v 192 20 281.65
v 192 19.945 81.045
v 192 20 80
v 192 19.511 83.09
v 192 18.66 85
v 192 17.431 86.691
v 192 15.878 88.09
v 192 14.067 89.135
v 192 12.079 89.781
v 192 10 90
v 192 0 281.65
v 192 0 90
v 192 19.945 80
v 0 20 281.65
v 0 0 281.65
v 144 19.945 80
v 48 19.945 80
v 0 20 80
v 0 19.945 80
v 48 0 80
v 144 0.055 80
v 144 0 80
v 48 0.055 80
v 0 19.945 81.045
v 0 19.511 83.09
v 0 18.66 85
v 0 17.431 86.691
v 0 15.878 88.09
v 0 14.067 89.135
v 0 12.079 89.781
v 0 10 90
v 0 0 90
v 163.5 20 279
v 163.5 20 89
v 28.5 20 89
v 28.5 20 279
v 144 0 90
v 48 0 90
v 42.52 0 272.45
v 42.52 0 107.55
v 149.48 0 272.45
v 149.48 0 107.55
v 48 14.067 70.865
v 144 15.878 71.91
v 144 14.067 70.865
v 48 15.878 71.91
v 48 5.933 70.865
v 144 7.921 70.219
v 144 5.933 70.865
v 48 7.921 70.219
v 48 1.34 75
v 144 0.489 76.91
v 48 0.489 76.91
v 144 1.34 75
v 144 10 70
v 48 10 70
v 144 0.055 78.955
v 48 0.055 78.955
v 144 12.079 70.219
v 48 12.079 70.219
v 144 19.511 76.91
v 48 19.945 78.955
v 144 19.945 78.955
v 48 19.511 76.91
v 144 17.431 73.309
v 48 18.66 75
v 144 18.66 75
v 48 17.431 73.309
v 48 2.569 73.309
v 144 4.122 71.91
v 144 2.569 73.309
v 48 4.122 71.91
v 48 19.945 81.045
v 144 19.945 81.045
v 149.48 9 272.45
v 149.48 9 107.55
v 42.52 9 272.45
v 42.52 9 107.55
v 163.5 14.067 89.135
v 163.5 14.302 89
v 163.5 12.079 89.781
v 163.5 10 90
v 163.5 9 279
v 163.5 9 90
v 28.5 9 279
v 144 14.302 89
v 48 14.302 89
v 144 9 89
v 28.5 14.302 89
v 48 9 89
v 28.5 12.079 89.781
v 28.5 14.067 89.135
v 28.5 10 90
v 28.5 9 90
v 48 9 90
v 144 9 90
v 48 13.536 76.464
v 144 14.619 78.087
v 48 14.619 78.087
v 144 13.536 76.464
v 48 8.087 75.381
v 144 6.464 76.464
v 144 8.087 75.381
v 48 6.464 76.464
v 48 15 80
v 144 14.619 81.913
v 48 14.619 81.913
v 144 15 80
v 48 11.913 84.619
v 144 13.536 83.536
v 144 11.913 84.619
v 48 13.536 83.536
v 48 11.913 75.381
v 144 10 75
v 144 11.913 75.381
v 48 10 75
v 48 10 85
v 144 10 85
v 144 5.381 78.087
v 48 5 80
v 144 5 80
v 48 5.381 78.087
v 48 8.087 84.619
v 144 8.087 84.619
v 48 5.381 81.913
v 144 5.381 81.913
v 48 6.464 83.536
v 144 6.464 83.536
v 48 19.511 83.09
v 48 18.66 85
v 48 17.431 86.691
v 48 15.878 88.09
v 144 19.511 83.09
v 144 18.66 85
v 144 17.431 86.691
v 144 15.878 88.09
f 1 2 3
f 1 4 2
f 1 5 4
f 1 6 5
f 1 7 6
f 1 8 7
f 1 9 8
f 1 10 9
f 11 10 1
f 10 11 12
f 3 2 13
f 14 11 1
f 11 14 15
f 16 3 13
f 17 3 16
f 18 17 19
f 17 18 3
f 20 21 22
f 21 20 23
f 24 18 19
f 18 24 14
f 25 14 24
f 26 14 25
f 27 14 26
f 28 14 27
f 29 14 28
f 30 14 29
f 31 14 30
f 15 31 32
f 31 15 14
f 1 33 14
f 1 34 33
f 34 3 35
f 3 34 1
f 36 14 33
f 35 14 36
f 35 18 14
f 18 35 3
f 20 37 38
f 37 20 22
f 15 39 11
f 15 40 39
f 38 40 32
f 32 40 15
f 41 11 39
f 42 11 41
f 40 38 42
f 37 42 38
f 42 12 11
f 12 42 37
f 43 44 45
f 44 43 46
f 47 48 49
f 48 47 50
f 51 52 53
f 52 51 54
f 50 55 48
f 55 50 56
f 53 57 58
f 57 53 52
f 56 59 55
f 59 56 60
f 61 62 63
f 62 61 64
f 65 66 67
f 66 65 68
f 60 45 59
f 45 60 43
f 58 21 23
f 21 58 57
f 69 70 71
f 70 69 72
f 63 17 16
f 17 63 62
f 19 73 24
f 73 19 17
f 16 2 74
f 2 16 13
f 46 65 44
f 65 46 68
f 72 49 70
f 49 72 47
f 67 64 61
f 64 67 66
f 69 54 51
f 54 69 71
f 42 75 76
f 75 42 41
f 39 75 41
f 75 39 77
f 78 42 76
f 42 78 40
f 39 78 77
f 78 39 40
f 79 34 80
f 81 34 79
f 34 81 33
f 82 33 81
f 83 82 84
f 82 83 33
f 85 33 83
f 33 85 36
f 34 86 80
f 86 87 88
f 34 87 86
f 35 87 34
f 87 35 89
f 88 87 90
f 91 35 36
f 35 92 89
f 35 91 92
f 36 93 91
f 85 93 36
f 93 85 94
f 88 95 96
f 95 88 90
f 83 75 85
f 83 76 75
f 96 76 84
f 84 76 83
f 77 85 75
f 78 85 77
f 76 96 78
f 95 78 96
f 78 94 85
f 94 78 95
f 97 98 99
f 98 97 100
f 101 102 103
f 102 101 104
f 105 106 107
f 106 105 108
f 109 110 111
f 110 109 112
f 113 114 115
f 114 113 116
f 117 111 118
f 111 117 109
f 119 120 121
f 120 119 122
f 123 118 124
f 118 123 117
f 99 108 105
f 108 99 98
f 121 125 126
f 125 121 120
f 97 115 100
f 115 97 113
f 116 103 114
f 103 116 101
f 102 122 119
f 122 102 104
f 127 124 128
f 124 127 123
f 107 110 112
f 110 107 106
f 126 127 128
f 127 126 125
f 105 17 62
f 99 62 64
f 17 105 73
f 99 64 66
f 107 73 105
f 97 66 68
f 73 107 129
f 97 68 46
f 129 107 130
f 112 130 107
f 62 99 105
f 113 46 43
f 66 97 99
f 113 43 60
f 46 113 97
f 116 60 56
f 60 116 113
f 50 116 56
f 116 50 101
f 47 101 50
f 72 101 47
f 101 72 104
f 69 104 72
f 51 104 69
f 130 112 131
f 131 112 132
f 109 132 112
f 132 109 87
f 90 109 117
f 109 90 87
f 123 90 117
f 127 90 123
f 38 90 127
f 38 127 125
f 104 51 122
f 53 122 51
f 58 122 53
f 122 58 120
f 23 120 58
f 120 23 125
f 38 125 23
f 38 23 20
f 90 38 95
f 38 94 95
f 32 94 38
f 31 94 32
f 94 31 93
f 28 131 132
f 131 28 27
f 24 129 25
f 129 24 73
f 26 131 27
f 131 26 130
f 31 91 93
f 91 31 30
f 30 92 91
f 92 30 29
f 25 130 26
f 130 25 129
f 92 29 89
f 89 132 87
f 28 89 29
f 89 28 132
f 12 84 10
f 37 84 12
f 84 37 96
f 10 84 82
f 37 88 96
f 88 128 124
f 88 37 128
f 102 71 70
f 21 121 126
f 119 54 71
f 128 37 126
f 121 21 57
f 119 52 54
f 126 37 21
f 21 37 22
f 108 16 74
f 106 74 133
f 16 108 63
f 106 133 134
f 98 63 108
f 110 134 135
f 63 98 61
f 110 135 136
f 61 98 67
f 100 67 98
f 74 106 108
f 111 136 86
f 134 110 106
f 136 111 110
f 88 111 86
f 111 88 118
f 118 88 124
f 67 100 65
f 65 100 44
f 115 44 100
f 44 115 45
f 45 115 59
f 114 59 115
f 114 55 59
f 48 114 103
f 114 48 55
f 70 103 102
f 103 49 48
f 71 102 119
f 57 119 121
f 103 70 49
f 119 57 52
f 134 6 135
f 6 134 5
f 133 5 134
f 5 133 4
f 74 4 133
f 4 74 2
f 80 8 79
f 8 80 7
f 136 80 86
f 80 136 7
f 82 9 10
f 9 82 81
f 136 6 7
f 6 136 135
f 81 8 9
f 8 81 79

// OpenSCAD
/*

SE/3D is the best name I can come up with for a machine that combines a 3 axis CNC
with a computer to design, model and program the things the CNC is used to make. 

Some basic (potential) requirements:
* Portable
* 3d printing
* lasering
* milling(?)
* Solder station
* VOM/o-scope
* Parts bin
* 100mm3 build volume
* Fast enough to print the entire build envelope in ~30 minutes
* Core-XY (http://corexy.com/theory.html)
* 3D scanner (object capture, teleportation)

The design is based on the Macintosh SE/30.  It occured to me when I saw my (unfinished)
Tantilus printer next to an actual Macintosh SE and noticied the similarity. 

(then why is it based on the SE/30 and not the SE?  Because the SE/30 is cooler)

In a perfect world the SE/3D would be a true Reprap and capable of producing offspring. 
I'll try to make that happen.

Parts (other than the 3D printed parts)
* Waveshare LCD
* Some SBC
* Some CNC control board (RAMPS? RAMBO?)
* NEMA?? Stepper motors (x3)
* Belts
* Toothed pulley (x2), maybe they are called cogs?
* Various "minerals"

*/

/*
Original SE/30 dimensions.
(https://en.wikipedia.org/wiki/Macintosh_SE/30)
HEIGHT: 350
WIDTH:  240
DEPTH:  280
*/

SCALE = 0.80;
WALL_THICKNESS = 3;

HEIGHT = 350 * SCALE;
WIDTH = 240 * SCALE;
DEPTH = 280 * SCALE;

DOOR_HEIGHT = 250 * SCALE;
DOOR_DEPTH = 20;

FOOT_HEIGHT = HEIGHT * .15;

BIN_HEIGHT = HEIGHT * .25;
BIN_WIDTH = WIDTH * .90;
BIN_DEPTH = DEPTH-DOOR_DEPTH-10;

// Display dimensions
LCD_HEIGHT = 164.90;
LCD_WIDTH = 124.27;
LCD_DEPTH = 10; // estimate

// TODO: Get SBC dimensions
// TODO: Get CNC controller dimensions
// TODO: Get power supply dimensions

/*
difference(){
    
    // main body
    cube([WIDTH, DEPTH, HEIGHT]);
    
    // hollow-out 
    translate([WALL_THICKNESS,DOOR_DEPTH+WALL_THICKNESS,WALL_THICKNESS]){
      cube([WIDTH-(WALL_THICKNESS*2), DEPTH-DOOR_DEPTH-(WALL_THICKNESS*2), HEIGHT-WALL_THICKNESS*2]);
    }

    // Cut-out "foot"
    translate([0,0,0]){
        cube([WIDTH,DOOR_DEPTH,FOOT_HEIGHT]);
    }
    
    // TODO: Cut-out carry handle
    // TODO: Cut-out XY axis
    // TODO: Cut-out Z axis
    // TODO: Cut-out ventilation slots around base
    
    // Cut-out door
    // TODO: Figure out why this is leaving a "lip" at the front 
    // (just above the door hinge)
    translate([0,0,HEIGHT-DOOR_HEIGHT]){
        door(true,false,false);
        rotate_about_pt(-5,0,0,[DOOR_DEPTH/2,DOOR_DEPTH/2]){
          scale([1,1,1.1]){
            door(true, false, false);
          }
        }
        
        // pin hole
        translate([0,DOOR_DEPTH/2,0]){
            rotate([0,90,0]){
                cylinder(r=DOOR_DEPTH/4,h=WIDTH);
            }
        }
    }
}
*/

/*
// CNC build envelope
translate([(WIDTH/2)-50,(DEPTH/2)-50,(HEIGHT/2)-50]){
  color("pink"){
    cube([100,100,100]);
  }
}
*/


// Door
translate([0,0,HEIGHT-DOOR_HEIGHT]){
    rotate_about_pt(0,0,0,[DOOR_DEPTH/2,DOOR_DEPTH/2]){
        door(true, true, true);
    }
}

/*
// Z Axis
translate([WIDTH/2,DEPTH-WALL_THICKNESS-20,WALL_THICKNESS]){
    zAxis();
}

// XY Axis
translate([0,60,HEIGHT-30]){
    xyAxis();
}
*/

module xyAxis(){
    
    // x axis stepper & mount
    translate([WALL_THICKNESS,0,0]){
        cube([40,40,8]);
        translate([20,20,-40]){
            color("silver"){
                cylinder(r=5,h=50);
                translate([-20,-20,0]){            
                    cube([40,40,40]);            
                }
            }
        }
    }
    
    // y axis stepper & mount
    translate([WIDTH-WALL_THICKNESS-40,0,0]){
        cube([40,40,8]);
        translate([20,20,-40]){
            color("silver"){
                cylinder(r=5,h=50);
                translate([-20,-20,0]){
                    cube([40,40,40]);
                }
            }
        }
    }
    
    // left pulleys & mount
    translate([WALL_THICKNESS,125,0]){
        cube([40,40,8]);
    }
    
    // right pulleys & mount
    translate([WIDTH-WALL_THICKNESS-40,125,0]){
        cube([40,40,8]);
    }
    
    // y axis rods
    translate([WALL_THICKNESS+40/4,0,4]){
        rotate([-90,0,0]){
            cylinder(r=3, h=150);
        }
    }
    translate([WALL_THICKNESS+40-(40/4),0,4]){
        rotate([-90,0,0]){
            cylinder(r=3, h=150);
        }
    }
    
    // TODO: x axis rods
    // TODO: x axis ...sleds?
    // TODO: x axis carriage
}

module zAxis(){
    
    // z axis stepper
    cylinder(r=5,h=50);
    translate([-20,-20,0]){
        cube([40,40,40]);
    }
    
    // z axis leadscrew
    cylinder(r=3,h=HEIGHT);
    
    // z axis rods
    translate([-25,0,0]){
        cylinder(r=3,h=HEIGHT);
    }
    translate([25,0,0]){
        cylinder(r=3,h=HEIGHT);
    }
    
    // z axis bed
    translate([-55,-115,75]){
        cube([110,110,5]);
    }
}

module door(pin, thing, lcd){
    
    /*
    Right now this is mostly a placeholder, because as-is
    it couldn't contain the LCD (it just has a hole the size
    of the bounding box of the LCD & its mountpoints).
    
    I'm considering covering the back of the door with a
    panel (acrylic? aluminum?) to both enclose the LCD and
    provide a flat, sturdy work surface.  Acrylic has the 
    advantage of being able to be back or side-lit and provide
    illumination to the workpiece.
    */
    
    difference(){
        
        union(){
            // Door outline
            // TODO: This "+1.65" adjustment is wack,
            // and probably won't handle scale changes,
            // come up with something better.
            cube([WIDTH,DOOR_DEPTH,DOOR_HEIGHT+1.65]);
            
            // Hinge barrel
            translate([0,DOOR_DEPTH/2,0]){
                rotate([0,90,0]){
                    cylinder(r=(DOOR_DEPTH/2),h=WIDTH);
                }
            }
        }
        
        // Hinge pin
        if(pin){
            translate([0,DOOR_DEPTH/2,0]){
                rotate([0,90,0]){
                    cylinder(r=DOOR_DEPTH/4,h=WIDTH);
                }
            }
        }
        
        // Hinge slots
        if(thing){
            cube([WIDTH/4,DOOR_DEPTH/2,DOOR_DEPTH/2]);
        }
        translate([0,DOOR_DEPTH/2,0]){
            rotate([0,90,0]){
                cylinder(r=(DOOR_DEPTH/2),h=WIDTH/4);                
            }
        }
        
        if(thing){
            translate([WIDTH-(WIDTH/4),0,0]){
                cube([WIDTH/4,DOOR_DEPTH/2,DOOR_DEPTH/2]);
            }
        }
        translate([WIDTH-(WIDTH/4),DOOR_DEPTH/2,0]){
            rotate([0,90,0]){
                cylinder(r=(DOOR_DEPTH/2),h=WIDTH/4);                
            }
        }
        
        if(lcd){
            LCD_BOARD_LENGTH = 190; //180; //164.90;
            LCD_BOARD_WIDTH = 135; //124.27;
            //LCD_MOUNT_LENGTH_CENTERPOINT = 156.90;
            //LCD_MOUNT_WIDTH_CENTERPOINT = 114.96;
            
            LCD_SCREEN_LENGTH = 164.90;
            LCD_SCREEN_WIDTH = 106.96;
            
            // LCD cut-out
            //translate([(WIDTH/2)-(LCD_WIDTH/2),0,(DOOR_HEIGHT/2)-(LCD_HEIGHT/2)]){
            // note: DOOR_DEPTH/2 is used here to compensate for the space consumed
            // by the hinge when centering the LCD vertically
            translate([(WIDTH/2)-(LCD_SCREEN_WIDTH/2),-1,(DOOR_HEIGHT/2)-(LCD_SCREEN_LENGTH/2)+(DOOR_DEPTH/2)]){
                //cube([LCD_WIDTH,LCD_DEPTH,LCD_HEIGHT]);
                
                // screen hole
                cube([LCD_SCREEN_WIDTH,25,LCD_SCREEN_LENGTH]);
                
                // board hole
                translate([(LCD_SCREEN_WIDTH/2)-(LCD_BOARD_WIDTH/2),DOOR_DEPTH/2,(LCD_SCREEN_LENGTH/2)-(LCD_BOARD_LENGTH/2)-6]){
                    cube([LCD_BOARD_WIDTH,25,LCD_BOARD_LENGTH]);
                }
            }
        }
    }
}


// Rotates object around specified point
module rotate_about_pt(x, z, y, pt) {
    translate(pt)
        rotate([x, y, z])
            translate(-pt)
                children();   
}
